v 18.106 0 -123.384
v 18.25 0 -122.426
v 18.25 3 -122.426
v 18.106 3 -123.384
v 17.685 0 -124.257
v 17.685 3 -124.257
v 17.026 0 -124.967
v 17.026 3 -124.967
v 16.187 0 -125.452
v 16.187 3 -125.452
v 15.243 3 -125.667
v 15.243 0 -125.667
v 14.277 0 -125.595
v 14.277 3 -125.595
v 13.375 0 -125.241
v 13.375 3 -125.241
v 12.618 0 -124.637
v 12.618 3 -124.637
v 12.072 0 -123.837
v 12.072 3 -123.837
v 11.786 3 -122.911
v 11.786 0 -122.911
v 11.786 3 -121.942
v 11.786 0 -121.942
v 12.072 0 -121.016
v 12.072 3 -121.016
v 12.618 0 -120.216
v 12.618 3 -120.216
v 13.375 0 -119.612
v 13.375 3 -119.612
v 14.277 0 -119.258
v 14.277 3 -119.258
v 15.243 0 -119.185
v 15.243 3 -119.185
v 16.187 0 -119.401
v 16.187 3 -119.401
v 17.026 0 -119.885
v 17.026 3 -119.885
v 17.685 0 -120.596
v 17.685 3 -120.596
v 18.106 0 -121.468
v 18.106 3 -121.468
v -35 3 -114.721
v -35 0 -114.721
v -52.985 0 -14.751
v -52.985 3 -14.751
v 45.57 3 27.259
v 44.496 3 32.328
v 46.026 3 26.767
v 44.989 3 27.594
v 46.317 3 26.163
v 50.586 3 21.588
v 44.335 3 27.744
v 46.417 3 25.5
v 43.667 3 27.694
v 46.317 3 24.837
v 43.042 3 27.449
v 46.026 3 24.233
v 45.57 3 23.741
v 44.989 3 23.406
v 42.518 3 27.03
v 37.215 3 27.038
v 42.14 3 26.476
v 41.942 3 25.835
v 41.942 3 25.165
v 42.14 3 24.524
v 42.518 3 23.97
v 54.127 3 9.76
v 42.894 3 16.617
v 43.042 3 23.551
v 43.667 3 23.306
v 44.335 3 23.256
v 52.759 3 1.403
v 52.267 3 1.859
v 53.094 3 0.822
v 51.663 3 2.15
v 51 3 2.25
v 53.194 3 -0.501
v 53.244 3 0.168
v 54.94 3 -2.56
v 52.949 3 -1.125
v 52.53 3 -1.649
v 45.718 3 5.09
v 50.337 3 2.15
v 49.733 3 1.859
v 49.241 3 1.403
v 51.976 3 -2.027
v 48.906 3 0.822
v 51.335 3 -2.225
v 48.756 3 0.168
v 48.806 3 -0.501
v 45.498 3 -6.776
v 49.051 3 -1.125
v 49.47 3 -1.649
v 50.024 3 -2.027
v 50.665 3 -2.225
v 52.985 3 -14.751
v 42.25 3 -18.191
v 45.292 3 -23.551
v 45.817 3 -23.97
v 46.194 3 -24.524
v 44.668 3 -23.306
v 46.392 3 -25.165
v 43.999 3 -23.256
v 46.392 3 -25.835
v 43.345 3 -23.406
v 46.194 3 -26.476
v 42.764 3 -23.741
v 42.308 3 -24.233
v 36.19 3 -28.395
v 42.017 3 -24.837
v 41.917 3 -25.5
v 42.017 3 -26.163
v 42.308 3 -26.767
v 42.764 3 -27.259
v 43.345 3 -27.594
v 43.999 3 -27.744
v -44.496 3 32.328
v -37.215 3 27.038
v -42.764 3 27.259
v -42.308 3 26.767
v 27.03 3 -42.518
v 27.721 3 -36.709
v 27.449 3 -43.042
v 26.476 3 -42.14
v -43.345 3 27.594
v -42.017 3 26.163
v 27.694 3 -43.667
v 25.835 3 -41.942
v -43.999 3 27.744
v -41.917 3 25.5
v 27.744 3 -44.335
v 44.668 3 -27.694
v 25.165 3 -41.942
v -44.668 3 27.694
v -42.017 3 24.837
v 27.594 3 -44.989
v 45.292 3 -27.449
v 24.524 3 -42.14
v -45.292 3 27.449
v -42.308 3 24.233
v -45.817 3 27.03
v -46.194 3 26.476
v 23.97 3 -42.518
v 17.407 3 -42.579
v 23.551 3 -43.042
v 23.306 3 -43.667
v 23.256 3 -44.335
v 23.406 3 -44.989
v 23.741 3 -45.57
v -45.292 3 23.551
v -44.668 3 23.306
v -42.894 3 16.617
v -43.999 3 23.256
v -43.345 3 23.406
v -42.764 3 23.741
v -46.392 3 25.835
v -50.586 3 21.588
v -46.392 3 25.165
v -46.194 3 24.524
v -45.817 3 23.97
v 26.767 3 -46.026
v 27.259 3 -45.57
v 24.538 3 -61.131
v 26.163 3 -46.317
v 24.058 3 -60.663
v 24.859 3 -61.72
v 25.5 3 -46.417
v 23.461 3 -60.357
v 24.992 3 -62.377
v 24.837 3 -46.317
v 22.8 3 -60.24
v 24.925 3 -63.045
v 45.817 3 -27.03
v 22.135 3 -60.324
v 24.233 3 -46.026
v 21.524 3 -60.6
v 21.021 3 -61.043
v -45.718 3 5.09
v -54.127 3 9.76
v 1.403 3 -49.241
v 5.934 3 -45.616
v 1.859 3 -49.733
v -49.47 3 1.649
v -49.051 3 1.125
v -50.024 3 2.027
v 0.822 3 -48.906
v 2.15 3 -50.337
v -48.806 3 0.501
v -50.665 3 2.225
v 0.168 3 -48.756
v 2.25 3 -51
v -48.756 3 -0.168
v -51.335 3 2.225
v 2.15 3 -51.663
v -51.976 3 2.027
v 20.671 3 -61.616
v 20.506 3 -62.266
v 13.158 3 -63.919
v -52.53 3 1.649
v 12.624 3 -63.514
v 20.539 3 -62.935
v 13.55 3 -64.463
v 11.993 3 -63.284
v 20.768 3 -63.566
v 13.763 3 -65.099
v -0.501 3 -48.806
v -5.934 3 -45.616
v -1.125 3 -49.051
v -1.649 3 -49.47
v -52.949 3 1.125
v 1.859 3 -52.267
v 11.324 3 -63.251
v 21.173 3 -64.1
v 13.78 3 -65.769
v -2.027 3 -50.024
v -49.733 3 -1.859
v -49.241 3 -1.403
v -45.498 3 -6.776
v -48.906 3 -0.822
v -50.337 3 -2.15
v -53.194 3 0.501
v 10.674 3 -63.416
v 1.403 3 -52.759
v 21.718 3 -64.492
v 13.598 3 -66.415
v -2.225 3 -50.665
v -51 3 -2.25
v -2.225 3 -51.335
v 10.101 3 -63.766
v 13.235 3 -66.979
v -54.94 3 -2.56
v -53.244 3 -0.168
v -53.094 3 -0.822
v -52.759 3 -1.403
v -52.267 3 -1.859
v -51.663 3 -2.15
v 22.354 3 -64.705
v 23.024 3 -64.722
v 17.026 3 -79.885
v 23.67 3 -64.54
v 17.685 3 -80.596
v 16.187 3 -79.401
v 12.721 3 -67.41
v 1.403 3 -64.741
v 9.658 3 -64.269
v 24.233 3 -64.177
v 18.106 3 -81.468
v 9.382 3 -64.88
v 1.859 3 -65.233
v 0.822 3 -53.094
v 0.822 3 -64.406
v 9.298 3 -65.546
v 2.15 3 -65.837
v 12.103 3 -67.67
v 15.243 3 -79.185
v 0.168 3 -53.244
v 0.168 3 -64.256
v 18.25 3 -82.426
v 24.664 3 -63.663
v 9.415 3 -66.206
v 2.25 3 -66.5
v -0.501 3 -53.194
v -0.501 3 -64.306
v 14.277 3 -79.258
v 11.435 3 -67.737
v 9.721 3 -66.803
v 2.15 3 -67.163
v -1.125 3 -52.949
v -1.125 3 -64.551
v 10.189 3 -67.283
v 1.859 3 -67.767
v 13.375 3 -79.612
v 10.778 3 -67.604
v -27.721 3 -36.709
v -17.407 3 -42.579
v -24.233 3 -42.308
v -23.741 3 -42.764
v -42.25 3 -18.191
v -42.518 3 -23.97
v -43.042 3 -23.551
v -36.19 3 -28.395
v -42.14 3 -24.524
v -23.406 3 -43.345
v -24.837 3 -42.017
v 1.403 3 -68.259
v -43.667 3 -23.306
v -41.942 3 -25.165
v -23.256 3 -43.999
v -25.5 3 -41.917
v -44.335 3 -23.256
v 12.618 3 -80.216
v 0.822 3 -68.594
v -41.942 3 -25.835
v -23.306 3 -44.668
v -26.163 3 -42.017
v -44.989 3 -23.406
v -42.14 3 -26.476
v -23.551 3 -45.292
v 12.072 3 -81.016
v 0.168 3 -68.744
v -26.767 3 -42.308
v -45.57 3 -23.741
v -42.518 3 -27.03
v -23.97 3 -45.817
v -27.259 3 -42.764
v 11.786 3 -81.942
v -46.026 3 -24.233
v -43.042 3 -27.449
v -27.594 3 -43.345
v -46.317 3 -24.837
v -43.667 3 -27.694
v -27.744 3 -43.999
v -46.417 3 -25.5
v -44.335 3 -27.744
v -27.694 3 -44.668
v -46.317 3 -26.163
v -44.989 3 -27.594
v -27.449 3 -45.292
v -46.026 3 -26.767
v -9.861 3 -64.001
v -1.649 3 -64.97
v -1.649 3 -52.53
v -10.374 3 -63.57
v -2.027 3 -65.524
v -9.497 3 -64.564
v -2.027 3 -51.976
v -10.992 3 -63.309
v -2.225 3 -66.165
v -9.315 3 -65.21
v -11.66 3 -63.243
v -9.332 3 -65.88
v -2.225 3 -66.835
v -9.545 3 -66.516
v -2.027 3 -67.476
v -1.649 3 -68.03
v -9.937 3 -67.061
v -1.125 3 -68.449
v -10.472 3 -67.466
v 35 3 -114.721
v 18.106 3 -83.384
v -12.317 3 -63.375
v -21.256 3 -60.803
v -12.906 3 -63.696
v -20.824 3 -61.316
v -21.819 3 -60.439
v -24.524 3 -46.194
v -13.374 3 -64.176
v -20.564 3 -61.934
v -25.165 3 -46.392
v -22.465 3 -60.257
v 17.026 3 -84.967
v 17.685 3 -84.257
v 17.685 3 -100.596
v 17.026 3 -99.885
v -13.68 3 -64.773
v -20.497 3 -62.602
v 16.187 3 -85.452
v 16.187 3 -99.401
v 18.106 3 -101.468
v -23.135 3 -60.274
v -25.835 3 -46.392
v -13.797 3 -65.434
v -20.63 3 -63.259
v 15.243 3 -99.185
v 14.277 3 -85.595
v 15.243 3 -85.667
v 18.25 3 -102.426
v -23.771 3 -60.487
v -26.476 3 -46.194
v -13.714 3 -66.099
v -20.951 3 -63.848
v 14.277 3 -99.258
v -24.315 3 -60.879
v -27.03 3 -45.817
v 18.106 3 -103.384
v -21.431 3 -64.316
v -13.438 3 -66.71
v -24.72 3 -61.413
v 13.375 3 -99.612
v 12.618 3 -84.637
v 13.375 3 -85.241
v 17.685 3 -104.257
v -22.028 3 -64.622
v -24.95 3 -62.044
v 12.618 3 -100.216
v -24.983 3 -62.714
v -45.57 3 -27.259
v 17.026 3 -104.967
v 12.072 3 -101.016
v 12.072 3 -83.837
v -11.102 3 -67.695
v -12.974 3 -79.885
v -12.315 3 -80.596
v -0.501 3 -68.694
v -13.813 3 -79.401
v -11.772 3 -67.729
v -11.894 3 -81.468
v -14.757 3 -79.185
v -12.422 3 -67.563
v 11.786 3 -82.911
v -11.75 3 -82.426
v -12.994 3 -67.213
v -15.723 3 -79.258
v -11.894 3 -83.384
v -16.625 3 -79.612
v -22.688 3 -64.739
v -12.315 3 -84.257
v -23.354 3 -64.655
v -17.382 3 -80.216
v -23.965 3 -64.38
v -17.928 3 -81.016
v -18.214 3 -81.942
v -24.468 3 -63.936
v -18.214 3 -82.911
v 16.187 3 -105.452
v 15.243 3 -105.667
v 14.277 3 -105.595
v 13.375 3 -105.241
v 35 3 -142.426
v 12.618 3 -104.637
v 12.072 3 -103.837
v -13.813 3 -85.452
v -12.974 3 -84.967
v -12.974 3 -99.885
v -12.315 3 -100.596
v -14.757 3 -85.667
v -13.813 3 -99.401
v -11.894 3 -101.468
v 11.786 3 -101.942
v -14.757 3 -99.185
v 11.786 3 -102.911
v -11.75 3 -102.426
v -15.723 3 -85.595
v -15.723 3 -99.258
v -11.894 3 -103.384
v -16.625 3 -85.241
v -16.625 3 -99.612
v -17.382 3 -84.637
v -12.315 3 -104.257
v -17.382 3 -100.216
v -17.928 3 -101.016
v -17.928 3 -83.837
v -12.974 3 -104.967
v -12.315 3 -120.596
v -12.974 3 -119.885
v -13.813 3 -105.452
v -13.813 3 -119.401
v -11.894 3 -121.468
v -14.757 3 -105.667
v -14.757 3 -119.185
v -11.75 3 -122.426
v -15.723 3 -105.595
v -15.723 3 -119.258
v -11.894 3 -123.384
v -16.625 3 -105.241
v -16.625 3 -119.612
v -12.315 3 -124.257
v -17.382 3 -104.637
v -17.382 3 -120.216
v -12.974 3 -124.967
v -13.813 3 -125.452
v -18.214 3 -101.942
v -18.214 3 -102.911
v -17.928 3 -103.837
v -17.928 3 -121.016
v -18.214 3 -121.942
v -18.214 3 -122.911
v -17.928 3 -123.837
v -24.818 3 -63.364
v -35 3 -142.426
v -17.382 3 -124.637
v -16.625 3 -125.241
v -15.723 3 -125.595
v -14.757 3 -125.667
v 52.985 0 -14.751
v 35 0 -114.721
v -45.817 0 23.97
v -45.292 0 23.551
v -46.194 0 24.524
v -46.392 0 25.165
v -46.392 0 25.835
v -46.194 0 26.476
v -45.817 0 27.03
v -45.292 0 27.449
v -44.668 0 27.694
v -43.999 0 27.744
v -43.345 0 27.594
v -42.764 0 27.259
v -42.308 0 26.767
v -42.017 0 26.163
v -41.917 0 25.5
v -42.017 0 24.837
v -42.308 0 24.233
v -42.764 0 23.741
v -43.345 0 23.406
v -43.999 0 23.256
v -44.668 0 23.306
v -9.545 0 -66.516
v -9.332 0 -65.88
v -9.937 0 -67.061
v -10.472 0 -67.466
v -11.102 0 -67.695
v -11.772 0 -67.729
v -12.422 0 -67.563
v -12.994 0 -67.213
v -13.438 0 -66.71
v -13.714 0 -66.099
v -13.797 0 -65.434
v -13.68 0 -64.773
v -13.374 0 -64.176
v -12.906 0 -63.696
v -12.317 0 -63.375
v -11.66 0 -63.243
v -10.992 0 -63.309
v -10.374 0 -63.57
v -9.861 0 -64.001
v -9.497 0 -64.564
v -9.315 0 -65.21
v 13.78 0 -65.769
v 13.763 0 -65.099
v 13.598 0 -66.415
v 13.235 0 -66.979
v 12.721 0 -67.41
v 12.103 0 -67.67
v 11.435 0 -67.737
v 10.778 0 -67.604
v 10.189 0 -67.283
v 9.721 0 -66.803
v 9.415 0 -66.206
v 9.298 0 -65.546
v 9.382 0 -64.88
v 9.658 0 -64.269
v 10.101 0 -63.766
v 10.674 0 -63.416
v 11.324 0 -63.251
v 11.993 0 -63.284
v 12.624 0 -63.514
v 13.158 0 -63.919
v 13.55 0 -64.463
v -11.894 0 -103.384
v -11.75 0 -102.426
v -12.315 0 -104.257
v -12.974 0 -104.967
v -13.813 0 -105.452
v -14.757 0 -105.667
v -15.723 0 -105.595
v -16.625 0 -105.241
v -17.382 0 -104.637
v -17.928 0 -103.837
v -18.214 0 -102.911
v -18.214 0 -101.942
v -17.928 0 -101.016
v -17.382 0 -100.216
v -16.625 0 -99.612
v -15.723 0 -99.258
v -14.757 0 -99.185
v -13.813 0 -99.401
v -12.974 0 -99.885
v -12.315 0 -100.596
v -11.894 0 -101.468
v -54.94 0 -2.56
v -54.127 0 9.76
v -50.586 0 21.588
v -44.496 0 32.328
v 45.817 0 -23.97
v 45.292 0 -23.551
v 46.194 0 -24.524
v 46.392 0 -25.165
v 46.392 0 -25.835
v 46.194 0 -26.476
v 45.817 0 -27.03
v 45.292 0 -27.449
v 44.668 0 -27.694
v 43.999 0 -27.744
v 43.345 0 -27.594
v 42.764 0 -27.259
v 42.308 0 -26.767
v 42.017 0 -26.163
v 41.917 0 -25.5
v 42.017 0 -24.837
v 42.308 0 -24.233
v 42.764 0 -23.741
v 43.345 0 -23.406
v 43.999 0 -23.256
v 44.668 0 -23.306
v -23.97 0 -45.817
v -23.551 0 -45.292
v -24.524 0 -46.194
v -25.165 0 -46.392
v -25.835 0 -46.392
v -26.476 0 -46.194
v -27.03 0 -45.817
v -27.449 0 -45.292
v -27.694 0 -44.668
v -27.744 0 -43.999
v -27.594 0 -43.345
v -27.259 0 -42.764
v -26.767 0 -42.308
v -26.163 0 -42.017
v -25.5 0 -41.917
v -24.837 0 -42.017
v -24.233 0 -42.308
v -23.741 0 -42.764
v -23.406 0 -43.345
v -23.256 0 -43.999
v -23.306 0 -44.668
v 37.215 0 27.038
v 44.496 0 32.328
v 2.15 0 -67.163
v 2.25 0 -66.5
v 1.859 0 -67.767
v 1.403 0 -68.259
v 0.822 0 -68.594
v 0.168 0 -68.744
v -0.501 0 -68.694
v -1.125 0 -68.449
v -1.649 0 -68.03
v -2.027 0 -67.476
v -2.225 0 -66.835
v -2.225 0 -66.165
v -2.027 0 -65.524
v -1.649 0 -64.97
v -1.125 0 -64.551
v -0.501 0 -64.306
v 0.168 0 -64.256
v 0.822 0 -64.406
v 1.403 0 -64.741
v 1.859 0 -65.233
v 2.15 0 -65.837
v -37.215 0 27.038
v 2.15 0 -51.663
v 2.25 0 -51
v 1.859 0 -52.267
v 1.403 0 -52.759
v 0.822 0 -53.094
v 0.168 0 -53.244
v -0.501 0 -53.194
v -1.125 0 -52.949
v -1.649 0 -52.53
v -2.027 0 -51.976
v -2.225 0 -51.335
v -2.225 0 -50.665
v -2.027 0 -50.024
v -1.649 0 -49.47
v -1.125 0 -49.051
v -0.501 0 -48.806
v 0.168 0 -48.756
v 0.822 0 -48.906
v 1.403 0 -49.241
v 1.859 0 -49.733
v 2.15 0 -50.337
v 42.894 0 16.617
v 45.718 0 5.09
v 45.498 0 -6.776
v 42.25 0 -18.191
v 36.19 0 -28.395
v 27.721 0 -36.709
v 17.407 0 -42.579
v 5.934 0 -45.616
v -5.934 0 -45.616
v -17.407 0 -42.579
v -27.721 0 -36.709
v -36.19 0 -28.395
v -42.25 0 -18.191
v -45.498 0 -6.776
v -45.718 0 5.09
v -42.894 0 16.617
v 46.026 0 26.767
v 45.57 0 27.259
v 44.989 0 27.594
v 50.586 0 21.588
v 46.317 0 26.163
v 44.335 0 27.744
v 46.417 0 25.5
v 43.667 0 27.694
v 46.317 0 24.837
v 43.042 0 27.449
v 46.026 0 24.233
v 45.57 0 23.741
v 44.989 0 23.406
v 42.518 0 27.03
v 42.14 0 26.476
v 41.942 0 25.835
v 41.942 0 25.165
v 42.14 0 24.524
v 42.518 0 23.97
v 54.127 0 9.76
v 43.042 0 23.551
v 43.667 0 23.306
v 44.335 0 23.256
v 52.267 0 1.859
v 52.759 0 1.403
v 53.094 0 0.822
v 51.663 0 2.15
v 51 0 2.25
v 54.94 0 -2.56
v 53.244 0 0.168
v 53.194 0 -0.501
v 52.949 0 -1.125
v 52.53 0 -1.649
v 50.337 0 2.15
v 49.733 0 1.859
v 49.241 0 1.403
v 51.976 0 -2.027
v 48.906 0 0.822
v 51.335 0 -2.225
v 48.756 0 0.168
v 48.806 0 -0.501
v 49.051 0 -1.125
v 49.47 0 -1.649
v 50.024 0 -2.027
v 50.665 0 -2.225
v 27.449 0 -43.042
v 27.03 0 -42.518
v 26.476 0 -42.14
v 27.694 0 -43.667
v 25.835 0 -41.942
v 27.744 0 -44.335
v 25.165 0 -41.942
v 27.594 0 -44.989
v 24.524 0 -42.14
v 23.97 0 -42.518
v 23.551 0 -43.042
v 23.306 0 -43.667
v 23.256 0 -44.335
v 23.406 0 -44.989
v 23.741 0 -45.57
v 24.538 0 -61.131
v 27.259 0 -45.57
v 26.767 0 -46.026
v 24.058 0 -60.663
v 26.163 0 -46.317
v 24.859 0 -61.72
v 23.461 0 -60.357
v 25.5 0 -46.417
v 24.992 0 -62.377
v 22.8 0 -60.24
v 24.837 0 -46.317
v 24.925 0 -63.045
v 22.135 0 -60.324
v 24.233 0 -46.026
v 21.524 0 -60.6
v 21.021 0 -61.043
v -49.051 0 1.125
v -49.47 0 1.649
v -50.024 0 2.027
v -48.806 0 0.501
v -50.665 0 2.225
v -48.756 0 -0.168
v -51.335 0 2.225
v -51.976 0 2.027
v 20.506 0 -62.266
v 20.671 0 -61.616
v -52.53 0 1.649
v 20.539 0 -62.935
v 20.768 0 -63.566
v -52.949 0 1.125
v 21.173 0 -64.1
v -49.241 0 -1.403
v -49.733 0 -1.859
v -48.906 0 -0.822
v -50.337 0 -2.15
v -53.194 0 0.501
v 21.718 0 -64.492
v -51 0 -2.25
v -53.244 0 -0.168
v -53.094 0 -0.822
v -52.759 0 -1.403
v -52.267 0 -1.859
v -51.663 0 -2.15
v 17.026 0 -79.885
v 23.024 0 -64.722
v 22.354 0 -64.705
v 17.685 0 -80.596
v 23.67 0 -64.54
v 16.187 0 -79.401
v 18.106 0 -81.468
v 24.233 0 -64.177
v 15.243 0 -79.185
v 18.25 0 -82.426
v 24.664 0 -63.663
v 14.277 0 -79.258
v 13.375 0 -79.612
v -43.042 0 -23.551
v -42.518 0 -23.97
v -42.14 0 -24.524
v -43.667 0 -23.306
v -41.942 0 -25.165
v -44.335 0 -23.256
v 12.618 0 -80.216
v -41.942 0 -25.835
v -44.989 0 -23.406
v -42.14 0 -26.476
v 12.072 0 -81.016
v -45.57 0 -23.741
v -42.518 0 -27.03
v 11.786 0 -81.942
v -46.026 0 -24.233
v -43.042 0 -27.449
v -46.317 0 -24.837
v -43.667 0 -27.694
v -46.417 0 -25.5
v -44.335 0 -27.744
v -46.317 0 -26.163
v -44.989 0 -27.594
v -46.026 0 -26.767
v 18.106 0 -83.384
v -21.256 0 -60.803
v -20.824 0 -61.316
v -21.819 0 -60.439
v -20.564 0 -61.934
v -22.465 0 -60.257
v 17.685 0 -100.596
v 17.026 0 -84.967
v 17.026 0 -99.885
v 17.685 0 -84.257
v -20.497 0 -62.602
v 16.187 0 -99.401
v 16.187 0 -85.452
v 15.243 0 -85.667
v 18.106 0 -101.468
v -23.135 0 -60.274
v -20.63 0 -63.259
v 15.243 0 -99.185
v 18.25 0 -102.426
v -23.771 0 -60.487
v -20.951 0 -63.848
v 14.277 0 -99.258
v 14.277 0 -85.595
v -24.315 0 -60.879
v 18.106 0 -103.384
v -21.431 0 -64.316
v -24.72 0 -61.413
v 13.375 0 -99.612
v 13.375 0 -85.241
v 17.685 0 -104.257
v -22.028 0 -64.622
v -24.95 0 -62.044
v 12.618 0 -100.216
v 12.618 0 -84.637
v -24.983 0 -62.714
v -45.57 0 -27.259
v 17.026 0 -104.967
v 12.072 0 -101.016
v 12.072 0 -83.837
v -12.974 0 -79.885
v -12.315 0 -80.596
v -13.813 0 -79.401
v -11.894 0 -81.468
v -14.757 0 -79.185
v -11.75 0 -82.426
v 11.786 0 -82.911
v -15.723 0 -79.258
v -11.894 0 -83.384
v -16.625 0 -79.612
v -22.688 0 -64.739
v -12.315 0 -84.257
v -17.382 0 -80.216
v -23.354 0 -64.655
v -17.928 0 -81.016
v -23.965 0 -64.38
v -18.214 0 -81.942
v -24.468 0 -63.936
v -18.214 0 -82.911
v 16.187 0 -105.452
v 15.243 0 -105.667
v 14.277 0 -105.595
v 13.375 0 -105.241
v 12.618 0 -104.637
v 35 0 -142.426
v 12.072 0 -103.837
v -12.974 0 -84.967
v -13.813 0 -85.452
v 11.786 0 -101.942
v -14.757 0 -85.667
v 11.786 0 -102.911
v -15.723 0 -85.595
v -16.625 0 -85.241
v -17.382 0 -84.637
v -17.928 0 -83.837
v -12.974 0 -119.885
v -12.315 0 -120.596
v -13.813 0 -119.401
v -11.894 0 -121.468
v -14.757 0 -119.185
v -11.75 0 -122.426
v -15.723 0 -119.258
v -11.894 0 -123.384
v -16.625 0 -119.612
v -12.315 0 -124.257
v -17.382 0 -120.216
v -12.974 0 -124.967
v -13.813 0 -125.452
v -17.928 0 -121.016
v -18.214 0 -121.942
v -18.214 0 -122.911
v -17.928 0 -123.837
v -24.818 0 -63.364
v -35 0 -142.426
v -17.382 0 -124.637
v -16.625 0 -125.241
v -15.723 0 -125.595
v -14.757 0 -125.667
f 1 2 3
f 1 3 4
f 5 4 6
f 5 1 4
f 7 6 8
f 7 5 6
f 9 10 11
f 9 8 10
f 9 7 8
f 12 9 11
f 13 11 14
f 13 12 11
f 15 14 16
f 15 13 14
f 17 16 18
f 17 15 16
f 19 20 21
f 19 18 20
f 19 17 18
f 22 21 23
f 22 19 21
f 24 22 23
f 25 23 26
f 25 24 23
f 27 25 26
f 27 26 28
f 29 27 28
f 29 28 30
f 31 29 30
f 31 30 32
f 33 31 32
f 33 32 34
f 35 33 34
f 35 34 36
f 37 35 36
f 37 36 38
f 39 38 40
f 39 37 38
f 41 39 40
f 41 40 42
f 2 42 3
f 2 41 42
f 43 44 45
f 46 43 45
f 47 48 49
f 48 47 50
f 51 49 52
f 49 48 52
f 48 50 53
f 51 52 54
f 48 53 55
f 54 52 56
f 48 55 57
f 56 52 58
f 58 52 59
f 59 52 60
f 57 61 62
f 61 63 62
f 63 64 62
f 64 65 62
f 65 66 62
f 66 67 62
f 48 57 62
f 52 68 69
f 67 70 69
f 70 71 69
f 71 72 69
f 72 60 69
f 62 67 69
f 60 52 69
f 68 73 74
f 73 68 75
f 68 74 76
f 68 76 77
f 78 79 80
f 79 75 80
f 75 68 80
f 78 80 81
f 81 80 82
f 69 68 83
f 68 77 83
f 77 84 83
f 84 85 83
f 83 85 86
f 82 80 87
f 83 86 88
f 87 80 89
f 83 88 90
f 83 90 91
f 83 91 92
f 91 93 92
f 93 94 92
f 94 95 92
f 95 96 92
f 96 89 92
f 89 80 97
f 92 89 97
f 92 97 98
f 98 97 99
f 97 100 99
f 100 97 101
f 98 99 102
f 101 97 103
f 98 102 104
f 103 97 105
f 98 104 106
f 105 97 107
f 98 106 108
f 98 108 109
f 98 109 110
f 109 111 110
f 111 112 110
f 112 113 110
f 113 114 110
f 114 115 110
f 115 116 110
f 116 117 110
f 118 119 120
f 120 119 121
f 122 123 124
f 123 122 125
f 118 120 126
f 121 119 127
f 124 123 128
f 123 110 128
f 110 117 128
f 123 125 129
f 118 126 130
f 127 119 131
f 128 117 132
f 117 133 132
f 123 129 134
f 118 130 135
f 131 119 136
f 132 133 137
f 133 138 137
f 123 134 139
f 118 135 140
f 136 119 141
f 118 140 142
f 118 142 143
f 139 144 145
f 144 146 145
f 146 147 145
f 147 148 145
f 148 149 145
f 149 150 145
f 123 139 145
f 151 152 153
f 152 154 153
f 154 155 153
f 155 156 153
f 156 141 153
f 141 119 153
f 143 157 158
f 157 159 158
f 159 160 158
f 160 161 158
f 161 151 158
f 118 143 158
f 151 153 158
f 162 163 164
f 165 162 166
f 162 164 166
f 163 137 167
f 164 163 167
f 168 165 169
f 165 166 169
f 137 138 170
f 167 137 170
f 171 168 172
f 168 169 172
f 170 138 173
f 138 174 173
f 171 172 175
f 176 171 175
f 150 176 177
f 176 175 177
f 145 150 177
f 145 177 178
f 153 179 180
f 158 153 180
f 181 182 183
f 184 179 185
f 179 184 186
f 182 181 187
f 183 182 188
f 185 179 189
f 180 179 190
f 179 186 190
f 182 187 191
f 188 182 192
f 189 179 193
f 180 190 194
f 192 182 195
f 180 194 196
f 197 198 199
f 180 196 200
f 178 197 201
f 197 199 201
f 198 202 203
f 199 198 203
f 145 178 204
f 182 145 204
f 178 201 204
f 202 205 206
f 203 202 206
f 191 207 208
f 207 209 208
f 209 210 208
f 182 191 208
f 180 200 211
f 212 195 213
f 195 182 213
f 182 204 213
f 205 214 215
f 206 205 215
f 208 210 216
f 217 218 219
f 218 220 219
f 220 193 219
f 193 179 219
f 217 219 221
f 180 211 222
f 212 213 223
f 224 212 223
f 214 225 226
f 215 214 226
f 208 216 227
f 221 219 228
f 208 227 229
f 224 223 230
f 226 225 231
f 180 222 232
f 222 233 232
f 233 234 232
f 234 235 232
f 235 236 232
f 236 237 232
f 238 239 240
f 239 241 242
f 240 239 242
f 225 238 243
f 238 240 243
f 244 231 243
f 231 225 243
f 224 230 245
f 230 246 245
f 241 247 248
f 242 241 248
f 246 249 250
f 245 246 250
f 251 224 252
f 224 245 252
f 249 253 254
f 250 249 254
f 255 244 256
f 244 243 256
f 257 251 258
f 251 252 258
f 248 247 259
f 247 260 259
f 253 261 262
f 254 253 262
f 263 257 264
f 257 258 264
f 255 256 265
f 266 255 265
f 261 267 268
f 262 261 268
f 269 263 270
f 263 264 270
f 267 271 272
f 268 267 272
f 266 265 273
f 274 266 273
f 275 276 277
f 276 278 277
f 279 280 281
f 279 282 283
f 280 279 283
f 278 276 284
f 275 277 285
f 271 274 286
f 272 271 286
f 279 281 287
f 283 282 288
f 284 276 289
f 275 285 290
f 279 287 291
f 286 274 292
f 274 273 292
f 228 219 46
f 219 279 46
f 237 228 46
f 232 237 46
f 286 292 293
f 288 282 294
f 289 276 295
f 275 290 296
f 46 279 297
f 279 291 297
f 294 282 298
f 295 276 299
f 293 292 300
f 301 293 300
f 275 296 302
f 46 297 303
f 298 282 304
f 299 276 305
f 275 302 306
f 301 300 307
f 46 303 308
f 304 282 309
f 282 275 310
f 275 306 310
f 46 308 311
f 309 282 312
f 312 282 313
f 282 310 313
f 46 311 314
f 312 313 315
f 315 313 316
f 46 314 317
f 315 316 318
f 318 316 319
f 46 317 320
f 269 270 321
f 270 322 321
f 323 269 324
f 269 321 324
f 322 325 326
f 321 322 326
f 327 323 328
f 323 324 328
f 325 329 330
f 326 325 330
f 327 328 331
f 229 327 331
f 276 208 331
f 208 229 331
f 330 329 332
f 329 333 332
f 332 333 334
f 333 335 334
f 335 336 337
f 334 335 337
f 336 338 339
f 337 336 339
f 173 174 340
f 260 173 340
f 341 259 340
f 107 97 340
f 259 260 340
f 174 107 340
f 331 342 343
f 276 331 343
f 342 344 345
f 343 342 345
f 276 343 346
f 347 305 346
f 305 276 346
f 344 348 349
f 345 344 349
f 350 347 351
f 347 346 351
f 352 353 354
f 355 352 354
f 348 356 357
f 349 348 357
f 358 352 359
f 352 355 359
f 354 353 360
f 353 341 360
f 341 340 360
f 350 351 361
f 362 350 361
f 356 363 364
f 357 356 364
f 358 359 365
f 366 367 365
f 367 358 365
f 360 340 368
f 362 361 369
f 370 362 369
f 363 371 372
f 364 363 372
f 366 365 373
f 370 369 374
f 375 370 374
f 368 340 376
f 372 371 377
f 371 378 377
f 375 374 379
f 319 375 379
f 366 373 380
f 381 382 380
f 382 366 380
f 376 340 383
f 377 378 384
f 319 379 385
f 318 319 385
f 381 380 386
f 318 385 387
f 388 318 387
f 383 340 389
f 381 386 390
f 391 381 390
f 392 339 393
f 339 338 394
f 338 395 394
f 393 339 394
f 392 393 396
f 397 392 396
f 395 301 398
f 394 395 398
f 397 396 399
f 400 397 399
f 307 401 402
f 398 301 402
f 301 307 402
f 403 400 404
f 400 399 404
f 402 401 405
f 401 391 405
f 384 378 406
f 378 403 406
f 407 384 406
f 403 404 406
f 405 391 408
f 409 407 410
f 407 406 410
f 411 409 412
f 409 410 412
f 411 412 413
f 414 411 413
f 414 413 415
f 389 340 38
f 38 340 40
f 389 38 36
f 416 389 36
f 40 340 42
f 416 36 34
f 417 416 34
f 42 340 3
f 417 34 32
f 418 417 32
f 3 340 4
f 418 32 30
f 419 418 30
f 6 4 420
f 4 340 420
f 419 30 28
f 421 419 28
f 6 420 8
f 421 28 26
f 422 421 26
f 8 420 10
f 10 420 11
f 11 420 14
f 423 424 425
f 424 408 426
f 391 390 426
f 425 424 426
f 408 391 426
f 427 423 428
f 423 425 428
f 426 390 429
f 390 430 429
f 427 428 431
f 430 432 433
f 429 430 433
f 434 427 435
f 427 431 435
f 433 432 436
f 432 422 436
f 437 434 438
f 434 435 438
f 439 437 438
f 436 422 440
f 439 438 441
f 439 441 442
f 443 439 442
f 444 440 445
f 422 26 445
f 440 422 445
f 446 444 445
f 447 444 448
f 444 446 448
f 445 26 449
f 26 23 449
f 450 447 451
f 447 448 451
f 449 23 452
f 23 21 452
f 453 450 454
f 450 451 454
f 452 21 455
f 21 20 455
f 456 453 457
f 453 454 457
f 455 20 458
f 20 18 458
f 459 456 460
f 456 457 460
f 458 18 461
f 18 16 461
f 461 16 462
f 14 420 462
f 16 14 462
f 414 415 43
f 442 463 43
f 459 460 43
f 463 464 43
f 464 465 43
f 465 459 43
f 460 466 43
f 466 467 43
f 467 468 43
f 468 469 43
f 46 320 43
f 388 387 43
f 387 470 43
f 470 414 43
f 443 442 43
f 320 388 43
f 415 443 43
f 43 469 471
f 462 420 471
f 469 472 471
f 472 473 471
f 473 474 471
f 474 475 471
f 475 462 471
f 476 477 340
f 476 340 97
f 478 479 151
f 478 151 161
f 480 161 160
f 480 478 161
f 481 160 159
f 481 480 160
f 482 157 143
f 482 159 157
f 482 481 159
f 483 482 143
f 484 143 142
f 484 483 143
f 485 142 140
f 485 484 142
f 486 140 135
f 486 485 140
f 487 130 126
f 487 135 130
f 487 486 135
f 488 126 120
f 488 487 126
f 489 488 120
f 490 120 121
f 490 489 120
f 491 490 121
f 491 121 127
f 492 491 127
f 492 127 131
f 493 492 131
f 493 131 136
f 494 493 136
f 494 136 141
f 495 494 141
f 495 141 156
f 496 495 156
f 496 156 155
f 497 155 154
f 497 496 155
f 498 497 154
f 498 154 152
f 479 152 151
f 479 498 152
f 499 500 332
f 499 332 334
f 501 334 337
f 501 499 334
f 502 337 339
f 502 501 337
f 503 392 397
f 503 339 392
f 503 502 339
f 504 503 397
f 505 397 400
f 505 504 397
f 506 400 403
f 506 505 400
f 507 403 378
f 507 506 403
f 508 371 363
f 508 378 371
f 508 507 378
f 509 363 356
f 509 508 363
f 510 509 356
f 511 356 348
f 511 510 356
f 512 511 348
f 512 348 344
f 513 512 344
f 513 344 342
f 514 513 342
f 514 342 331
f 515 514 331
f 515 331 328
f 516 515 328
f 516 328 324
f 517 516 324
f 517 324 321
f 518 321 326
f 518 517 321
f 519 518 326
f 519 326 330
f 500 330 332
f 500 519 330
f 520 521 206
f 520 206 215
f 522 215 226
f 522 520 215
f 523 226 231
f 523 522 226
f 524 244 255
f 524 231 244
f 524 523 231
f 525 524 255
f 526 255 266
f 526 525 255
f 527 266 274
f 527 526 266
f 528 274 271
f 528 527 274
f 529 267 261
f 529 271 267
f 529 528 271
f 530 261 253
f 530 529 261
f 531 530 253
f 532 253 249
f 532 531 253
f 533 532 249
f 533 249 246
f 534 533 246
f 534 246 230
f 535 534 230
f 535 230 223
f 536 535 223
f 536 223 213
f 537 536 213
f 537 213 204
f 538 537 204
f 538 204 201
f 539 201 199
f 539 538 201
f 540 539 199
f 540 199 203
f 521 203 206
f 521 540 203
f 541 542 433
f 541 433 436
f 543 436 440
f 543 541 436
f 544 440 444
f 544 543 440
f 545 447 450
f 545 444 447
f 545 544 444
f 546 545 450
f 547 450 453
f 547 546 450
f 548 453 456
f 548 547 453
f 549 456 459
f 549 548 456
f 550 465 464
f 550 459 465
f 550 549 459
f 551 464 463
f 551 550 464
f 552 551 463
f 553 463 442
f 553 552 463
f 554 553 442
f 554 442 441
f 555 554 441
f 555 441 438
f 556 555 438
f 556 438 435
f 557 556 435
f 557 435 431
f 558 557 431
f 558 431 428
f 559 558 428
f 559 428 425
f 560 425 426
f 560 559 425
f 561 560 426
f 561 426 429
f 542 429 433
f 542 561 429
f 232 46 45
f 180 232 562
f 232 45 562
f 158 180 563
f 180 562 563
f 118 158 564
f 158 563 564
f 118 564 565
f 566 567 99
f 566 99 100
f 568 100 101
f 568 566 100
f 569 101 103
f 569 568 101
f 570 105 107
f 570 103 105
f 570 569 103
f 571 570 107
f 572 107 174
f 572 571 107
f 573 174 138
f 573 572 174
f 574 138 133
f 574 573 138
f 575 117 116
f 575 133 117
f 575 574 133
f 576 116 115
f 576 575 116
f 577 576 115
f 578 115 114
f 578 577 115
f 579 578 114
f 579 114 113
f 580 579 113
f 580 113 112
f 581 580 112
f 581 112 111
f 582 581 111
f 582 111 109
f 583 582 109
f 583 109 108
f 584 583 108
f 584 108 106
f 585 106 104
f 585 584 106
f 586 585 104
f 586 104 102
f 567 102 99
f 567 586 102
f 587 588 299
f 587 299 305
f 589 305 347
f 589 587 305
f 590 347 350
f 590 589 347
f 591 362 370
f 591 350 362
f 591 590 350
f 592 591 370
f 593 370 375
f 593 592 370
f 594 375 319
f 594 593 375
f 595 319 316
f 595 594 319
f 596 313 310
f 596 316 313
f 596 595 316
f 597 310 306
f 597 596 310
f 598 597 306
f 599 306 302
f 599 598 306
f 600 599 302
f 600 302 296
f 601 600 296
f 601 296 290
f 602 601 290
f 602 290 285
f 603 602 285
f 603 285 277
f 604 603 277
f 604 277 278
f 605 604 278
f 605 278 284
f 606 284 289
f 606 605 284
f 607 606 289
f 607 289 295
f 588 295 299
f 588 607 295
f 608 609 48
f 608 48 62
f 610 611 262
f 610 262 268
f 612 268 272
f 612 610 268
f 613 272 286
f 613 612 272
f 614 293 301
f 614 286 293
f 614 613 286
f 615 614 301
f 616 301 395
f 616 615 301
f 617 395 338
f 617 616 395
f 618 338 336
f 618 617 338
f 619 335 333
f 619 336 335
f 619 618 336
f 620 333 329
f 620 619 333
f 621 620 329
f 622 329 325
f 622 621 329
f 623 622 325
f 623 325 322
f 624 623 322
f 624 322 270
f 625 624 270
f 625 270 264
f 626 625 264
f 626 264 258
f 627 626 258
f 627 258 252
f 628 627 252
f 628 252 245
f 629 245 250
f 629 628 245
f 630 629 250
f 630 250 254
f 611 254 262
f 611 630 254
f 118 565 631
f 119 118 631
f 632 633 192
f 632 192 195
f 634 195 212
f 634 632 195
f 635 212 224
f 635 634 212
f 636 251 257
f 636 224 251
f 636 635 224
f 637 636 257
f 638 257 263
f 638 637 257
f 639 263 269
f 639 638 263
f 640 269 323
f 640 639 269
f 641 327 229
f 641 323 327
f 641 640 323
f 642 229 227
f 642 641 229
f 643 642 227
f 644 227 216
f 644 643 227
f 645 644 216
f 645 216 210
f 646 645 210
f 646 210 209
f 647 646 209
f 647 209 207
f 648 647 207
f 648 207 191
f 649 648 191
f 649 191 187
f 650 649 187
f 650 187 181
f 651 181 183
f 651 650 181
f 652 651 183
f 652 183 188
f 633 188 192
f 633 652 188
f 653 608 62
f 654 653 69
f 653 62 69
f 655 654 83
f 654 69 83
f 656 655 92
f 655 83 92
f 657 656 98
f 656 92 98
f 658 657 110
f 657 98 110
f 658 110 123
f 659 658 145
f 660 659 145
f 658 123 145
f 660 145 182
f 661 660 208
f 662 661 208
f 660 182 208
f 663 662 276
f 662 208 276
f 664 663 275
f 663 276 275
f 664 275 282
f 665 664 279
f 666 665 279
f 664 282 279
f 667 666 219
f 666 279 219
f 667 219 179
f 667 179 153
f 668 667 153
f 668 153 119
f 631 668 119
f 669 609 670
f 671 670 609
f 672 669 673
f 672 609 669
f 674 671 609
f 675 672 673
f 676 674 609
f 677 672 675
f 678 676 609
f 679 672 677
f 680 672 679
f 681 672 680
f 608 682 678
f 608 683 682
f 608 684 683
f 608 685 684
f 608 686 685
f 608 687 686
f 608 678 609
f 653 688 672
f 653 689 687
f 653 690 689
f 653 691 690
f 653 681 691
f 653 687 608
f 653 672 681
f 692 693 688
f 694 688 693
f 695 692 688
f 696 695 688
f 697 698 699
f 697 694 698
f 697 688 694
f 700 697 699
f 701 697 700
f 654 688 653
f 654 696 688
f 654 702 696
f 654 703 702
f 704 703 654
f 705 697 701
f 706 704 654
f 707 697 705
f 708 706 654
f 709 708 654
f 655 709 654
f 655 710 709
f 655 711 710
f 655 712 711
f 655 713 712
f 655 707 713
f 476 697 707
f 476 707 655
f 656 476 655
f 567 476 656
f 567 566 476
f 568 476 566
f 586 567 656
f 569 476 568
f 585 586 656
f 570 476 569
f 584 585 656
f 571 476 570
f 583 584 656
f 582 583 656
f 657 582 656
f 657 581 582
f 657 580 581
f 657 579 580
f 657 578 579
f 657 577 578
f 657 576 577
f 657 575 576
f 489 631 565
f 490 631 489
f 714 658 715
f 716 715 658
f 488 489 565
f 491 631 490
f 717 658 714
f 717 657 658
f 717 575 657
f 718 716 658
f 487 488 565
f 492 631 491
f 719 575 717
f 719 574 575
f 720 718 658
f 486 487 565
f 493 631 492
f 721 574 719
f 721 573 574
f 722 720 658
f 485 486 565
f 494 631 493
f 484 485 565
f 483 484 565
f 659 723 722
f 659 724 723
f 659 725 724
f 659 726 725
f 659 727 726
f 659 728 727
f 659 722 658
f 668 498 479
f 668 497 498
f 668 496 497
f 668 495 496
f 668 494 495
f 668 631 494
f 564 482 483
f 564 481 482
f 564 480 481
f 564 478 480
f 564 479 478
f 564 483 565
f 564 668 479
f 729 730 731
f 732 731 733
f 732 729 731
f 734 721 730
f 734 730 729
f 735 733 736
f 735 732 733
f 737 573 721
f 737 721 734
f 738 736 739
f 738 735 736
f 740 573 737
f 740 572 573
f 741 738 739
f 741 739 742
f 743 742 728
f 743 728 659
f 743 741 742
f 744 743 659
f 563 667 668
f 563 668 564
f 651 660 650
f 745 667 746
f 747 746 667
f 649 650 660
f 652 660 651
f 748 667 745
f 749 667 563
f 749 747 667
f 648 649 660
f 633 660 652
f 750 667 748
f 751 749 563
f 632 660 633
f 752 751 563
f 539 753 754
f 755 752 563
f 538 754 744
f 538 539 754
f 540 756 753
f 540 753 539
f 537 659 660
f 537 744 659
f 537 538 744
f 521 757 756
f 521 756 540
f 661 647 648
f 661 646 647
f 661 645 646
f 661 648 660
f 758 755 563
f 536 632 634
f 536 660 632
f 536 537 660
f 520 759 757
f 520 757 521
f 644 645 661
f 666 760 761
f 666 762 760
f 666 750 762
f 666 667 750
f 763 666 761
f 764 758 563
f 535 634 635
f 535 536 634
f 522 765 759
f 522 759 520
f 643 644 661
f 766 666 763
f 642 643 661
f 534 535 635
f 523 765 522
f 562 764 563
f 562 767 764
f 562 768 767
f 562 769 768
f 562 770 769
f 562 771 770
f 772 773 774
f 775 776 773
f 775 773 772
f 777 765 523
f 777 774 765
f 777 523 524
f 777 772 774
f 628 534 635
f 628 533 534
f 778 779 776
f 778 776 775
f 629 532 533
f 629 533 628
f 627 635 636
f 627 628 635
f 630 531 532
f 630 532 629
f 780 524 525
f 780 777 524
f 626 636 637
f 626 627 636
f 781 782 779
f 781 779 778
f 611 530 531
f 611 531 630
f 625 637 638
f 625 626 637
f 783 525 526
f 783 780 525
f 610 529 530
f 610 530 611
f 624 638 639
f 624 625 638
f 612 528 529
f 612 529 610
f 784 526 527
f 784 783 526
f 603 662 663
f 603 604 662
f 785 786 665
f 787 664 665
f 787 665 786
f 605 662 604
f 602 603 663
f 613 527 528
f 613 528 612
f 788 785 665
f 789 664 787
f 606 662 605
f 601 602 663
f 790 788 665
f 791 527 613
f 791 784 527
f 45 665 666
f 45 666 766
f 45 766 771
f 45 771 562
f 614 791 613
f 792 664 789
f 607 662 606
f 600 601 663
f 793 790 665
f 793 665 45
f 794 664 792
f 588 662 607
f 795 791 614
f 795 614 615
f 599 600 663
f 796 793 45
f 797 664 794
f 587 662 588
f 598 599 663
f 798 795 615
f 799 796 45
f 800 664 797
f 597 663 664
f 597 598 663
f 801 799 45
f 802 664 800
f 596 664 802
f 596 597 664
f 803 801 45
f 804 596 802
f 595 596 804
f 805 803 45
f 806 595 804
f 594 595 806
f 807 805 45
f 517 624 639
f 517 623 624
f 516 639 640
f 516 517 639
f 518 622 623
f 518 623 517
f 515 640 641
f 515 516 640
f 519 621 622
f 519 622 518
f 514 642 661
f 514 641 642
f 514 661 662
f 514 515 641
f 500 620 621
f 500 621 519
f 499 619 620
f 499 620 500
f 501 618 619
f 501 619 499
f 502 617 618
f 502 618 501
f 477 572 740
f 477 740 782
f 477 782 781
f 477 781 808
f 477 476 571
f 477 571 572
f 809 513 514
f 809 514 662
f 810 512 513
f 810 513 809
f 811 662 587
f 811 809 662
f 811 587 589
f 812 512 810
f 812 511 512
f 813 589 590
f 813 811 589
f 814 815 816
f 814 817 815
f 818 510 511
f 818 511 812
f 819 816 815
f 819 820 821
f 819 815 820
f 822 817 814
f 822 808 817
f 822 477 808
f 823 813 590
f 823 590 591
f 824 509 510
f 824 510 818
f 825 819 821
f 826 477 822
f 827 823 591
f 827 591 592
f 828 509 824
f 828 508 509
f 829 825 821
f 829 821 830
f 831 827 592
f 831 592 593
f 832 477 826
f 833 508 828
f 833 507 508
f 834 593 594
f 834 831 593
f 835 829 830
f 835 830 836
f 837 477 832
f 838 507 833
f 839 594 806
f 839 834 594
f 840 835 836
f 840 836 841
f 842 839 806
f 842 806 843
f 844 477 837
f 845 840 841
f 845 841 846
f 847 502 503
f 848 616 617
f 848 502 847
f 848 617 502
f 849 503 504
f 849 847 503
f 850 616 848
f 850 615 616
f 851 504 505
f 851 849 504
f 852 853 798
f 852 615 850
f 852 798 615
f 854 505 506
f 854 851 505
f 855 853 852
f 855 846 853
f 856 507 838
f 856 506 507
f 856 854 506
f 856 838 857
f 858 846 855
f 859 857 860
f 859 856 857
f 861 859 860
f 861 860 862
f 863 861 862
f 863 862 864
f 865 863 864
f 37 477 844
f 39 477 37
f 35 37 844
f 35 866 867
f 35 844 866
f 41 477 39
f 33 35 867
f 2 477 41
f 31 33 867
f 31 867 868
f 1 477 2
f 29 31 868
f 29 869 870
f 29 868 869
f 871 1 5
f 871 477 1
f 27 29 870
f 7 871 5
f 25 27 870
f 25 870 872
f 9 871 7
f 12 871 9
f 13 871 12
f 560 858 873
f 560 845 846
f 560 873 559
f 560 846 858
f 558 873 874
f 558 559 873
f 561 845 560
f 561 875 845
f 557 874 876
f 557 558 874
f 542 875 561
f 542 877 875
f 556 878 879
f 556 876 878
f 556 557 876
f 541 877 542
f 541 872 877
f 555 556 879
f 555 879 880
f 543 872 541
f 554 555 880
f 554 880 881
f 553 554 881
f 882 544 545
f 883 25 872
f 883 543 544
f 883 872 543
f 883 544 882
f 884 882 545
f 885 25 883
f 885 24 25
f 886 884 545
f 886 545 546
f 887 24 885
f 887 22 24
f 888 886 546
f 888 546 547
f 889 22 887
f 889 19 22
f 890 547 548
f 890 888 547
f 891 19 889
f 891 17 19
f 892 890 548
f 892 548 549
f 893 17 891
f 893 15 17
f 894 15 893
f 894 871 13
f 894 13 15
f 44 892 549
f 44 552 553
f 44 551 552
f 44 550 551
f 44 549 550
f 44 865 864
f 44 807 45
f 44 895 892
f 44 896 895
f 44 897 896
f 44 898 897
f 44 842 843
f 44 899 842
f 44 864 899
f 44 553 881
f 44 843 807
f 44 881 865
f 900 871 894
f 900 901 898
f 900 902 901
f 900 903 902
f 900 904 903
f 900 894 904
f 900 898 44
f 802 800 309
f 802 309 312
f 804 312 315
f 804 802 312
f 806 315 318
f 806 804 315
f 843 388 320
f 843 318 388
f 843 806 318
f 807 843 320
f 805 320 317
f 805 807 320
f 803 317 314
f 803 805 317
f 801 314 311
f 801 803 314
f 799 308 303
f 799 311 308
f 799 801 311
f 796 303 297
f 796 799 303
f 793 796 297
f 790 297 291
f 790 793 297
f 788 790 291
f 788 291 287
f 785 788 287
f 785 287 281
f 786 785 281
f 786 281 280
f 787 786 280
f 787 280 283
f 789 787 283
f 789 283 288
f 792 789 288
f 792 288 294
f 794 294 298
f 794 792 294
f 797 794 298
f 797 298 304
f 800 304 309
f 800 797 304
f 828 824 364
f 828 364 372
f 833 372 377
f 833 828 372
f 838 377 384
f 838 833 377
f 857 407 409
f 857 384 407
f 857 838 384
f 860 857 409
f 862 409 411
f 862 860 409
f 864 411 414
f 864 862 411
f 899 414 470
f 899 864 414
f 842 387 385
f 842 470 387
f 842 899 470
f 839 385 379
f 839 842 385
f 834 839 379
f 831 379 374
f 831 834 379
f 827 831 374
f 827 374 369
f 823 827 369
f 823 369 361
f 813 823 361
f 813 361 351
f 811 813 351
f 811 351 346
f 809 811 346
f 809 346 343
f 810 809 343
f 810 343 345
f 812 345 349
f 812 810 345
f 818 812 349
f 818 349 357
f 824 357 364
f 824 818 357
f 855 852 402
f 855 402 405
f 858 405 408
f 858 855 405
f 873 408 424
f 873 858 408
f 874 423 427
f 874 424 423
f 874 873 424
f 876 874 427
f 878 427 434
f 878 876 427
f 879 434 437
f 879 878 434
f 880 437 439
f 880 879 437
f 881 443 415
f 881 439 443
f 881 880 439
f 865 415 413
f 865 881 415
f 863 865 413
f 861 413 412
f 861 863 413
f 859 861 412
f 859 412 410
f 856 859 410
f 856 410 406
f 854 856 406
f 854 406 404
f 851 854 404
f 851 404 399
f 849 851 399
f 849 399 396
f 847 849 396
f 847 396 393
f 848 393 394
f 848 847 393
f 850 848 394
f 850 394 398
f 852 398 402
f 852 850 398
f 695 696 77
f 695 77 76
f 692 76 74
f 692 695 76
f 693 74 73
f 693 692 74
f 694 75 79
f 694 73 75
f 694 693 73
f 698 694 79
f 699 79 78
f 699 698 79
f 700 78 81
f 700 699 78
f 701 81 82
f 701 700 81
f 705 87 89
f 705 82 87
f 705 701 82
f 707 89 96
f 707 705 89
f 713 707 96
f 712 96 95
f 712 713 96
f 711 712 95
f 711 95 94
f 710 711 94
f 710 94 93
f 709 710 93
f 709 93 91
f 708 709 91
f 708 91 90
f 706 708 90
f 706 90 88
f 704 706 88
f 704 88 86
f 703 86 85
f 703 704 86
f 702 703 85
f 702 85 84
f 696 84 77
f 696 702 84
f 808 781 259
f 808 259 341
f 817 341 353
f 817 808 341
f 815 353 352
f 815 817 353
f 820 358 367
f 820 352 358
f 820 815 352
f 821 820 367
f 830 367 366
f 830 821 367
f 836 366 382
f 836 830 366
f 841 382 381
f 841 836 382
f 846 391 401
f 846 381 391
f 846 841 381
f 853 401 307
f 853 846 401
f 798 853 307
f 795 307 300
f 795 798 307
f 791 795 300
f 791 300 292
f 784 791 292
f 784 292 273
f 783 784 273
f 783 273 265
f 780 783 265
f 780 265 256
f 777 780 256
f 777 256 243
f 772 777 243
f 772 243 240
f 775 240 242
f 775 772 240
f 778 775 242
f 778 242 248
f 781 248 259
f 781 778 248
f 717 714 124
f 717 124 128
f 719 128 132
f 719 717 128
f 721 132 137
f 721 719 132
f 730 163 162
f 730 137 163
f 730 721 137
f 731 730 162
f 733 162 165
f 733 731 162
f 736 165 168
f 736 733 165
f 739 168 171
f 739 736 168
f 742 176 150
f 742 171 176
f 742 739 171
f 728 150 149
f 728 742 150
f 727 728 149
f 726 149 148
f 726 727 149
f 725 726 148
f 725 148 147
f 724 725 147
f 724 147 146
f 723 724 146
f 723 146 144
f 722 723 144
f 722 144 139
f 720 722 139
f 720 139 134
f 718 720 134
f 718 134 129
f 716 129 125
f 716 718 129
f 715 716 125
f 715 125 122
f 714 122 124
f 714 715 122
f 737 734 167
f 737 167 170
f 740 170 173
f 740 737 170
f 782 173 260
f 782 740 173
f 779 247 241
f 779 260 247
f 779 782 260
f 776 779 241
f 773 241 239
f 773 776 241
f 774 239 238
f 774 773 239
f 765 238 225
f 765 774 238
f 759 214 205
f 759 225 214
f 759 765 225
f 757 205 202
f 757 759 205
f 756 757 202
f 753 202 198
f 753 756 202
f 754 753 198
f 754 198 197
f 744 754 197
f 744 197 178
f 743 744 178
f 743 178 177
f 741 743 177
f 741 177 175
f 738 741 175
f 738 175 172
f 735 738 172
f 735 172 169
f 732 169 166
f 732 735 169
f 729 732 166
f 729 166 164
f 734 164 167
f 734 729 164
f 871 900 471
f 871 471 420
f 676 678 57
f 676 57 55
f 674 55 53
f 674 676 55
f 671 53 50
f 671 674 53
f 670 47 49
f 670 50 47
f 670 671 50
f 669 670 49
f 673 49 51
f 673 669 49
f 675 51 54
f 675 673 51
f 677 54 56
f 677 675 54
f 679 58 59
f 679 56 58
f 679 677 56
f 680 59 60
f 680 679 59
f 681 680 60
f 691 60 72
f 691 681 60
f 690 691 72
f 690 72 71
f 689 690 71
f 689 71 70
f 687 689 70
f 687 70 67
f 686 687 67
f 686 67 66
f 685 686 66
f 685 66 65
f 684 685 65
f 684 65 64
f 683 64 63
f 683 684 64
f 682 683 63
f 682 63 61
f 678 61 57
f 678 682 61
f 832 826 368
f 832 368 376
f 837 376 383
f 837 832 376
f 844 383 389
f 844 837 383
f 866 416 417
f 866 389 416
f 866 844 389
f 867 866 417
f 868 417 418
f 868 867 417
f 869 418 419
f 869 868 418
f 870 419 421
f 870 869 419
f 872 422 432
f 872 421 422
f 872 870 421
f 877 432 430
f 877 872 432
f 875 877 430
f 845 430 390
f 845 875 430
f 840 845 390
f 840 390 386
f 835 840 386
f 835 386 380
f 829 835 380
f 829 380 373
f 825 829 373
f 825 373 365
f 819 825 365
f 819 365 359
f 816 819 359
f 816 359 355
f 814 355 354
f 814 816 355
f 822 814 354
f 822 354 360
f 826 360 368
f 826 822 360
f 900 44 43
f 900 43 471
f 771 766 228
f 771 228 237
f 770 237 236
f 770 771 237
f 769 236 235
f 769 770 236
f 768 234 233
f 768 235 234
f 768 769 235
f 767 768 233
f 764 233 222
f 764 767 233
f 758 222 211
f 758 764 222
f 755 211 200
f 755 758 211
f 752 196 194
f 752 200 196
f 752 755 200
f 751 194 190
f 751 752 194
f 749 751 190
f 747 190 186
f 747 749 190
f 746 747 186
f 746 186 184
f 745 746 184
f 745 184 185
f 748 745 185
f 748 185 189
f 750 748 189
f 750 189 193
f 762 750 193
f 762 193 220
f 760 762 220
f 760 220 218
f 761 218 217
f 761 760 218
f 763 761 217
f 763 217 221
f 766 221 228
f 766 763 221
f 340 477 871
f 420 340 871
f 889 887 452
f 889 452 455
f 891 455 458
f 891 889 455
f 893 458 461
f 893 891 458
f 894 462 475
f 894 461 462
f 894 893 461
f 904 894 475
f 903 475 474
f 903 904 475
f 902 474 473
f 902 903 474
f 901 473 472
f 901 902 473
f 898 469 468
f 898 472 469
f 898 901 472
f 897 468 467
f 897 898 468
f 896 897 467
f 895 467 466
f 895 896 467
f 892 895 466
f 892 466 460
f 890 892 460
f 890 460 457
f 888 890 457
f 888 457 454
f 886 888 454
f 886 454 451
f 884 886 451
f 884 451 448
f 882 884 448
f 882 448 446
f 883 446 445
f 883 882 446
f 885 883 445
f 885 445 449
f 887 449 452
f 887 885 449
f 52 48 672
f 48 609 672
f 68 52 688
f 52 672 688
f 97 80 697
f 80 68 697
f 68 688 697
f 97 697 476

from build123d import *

# Parameters (mm, degrees)
SKETCH1_R                       = 55
BOSS_EXTRUDE1_DEPTH             = 3
SKETCH2_W                       = 70
SKETCH2_H                       = 100
BOSS_EXTRUDE2_DEPTH             = 3
BOSS_EXTRUDE3_DEPTH             = 3
SKETCH4_R                       = 46
CUT_EXTRUDE2_DEPTH              = 1
CUT_EXTRUDE2_DEPTH_BACK         = 4
CUT_EXTRUDE5_START              = -4
CUT_EXTRUDE5_DEPTH              = 5
CUT_EXTRUDE3_START              = -4
SKETCH5_R                       = 2.25
CUT_EXTRUDE3_DEPTH              = 5
CIRPATTERN1_COUNT               = 12
CUT_EXTRUDE4_START              = -4
SKETCH6_R                       = 3.25
CUT_EXTRUDE4_DEPTH              = 5
LPATTERN1_COUNT                 = 3
LPATTERN1_PITCH                 = 20
CUT_EXTRUDE6_START              = -1
SKETCH8_R                       = 2.25
CUT_EXTRUDE6_DEPTH              = 5
CIRPATTERN2_COUNT               = 3
CIRPATTERN2_ANGLE               = 20
CIRPATTERN2_THE_OTHER_WAY_COUNT = 3
CIRPATTERN2_THE_OTHER_WAY_ANGLE = 20


with BuildPart() as part:
    # Sketch1 → Boss-Extrude1 (new body)
    with BuildSketch(Plane(origin=(0, 0, 0), x_dir=(1, 0, 0), z_dir=(0, 1, 0))):
        Circle(SKETCH1_R)
    extrude(amount=BOSS_EXTRUDE1_DEPTH)

    # Sketch2 → Boss-Extrude2 (add)
    with BuildSketch(Plane(origin=(0, 0, 0), x_dir=(1, 0, 0), z_dir=(0, 1, 0))):
        with Locations((0, 92.426406871)):
            Rectangle(SKETCH2_W, SKETCH2_H)
    extrude(amount=BOSS_EXTRUDE2_DEPTH)

    # Sketch9 → Boss-Extrude3 (add)
    with BuildSketch(Plane(origin=(0, 0, 0), x_dir=(1, 0, 0), z_dir=(0, 1, 0))):
        Polygon((-35, 114.721305974), (-52.984880526, 14.751353687), (-17.871452142, 14.751353687), align=None)
    boss_extrude3 = extrude(amount=BOSS_EXTRUDE3_DEPTH)

    # Mirror2: Boss-Extrude3 across plane
    add(boss_extrude3.mirror(Plane(origin=(0, 0, 0), x_dir=(0, 0, 1), z_dir=(1, 0, 0))))

    # Sketch4 → Cut-Extrude2 (cut, two sides)
    with BuildSketch(Plane(origin=(0, 3, 0), x_dir=(1, 0, 0), z_dir=(0, 1, 0))) as cut_extrude2_sk:
        Circle(SKETCH4_R)
    extrude(amount=CUT_EXTRUDE2_DEPTH, mode=Mode.SUBTRACT)
    extrude(cut_extrude2_sk.sketch, amount=-CUT_EXTRUDE2_DEPTH_BACK, mode=Mode.SUBTRACT)

    # Sketch7 → Cut-Extrude5 (cut)
    with BuildSketch(Plane(origin=(0, 3, 0), x_dir=(1, 0, 0), z_dir=(0, 1, 0)).offset(CUT_EXTRUDE5_START)):
        with BuildLine():
            Line((0, 0), (0, -55))
            ThreePointArc((0, -55), (-24.969477486, -49.00535883), (-44.495934691, -32.328188876))
            Line((-44.495934691, -32.328188876), (0, 0))
        make_face()
    cut_extrude5 = extrude(amount=CUT_EXTRUDE5_DEPTH, mode=Mode.SUBTRACT)

    # Mirror1: Cut-Extrude5 across plane
    add(cut_extrude5.mirror(Plane(origin=(0, 0, 0), x_dir=(0, 0, 1), z_dir=(1, 0, 0))), mode=Mode.SUBTRACT)

    # Sketch5 → Cut-Extrude3 (cut)
    with BuildSketch(Plane(origin=(0, 3, 0), x_dir=(1, 0, 0), z_dir=(0, 1, 0)).offset(CUT_EXTRUDE3_START)):
        with Locations((0, 51)):
            Circle(SKETCH5_R)
    cut_extrude3 = extrude(amount=CUT_EXTRUDE3_DEPTH, mode=Mode.SUBTRACT)

    # CirPattern1: Cut-Extrude3 ×12 about axis
    cirpattern1_axis = Axis((0, 0, 0), (0, 1, 0))
    for i in range(1, CIRPATTERN1_COUNT):
        add(cut_extrude3.rotate(cirpattern1_axis, i * 360 / CIRPATTERN1_COUNT), mode=Mode.SUBTRACT)

    # Sketch6 → Cut-Extrude4 (cut)
    with BuildSketch(Plane(origin=(0, 3, 0), x_dir=(1, 0, 0), z_dir=(0, 1, 0)).offset(CUT_EXTRUDE4_START)):
        with Locations((15, 122.426406871)):
            Circle(SKETCH6_R)
        with Locations((-15, 122.426406871)):
            Circle(SKETCH6_R)
    cut_extrude4 = extrude(amount=CUT_EXTRUDE4_DEPTH, mode=Mode.SUBTRACT)

    # LPattern1: Cut-Extrude4 ×3
    with Locations(*[(0, 0, i * LPATTERN1_PITCH) for i in range(1, LPATTERN1_COUNT)]):
        add(cut_extrude4, mode=Mode.SUBTRACT)

    # Sketch8 → Cut-Extrude6 (cut)
    with BuildSketch(Plane(origin=(0, 0, 0), x_dir=(1, 0, 0), z_dir=(0, 1, 0)).offset(CUT_EXTRUDE6_START)):
        with Locations((0, 66.5)):
            Circle(SKETCH8_R)
    cut_extrude6 = extrude(amount=CUT_EXTRUDE6_DEPTH, mode=Mode.SUBTRACT)

    # CirPattern2: Cut-Extrude6 ×3 about axis
    cirpattern2_axis = Axis((0, 0, 0), (0, 1, 0))
    for i in range(1, CIRPATTERN2_COUNT):
        add(cut_extrude6.rotate(cirpattern2_axis, i * CIRPATTERN2_ANGLE / (CIRPATTERN2_COUNT - 1)), mode=Mode.SUBTRACT)

    # CirPattern2 the other way: Cut-Extrude6 ×3 about axis
    cirpattern2_the_other_way_axis = Axis((0, 0, 0), (0, -1, 0))
    for i in range(1, CIRPATTERN2_THE_OTHER_WAY_COUNT):
        add(cut_extrude6.rotate(cirpattern2_the_other_way_axis, i * CIRPATTERN2_THE_OTHER_WAY_ANGLE / (CIRPATTERN2_THE_OTHER_WAY_COUNT - 1)), mode=Mode.SUBTRACT)


solid = part.part
